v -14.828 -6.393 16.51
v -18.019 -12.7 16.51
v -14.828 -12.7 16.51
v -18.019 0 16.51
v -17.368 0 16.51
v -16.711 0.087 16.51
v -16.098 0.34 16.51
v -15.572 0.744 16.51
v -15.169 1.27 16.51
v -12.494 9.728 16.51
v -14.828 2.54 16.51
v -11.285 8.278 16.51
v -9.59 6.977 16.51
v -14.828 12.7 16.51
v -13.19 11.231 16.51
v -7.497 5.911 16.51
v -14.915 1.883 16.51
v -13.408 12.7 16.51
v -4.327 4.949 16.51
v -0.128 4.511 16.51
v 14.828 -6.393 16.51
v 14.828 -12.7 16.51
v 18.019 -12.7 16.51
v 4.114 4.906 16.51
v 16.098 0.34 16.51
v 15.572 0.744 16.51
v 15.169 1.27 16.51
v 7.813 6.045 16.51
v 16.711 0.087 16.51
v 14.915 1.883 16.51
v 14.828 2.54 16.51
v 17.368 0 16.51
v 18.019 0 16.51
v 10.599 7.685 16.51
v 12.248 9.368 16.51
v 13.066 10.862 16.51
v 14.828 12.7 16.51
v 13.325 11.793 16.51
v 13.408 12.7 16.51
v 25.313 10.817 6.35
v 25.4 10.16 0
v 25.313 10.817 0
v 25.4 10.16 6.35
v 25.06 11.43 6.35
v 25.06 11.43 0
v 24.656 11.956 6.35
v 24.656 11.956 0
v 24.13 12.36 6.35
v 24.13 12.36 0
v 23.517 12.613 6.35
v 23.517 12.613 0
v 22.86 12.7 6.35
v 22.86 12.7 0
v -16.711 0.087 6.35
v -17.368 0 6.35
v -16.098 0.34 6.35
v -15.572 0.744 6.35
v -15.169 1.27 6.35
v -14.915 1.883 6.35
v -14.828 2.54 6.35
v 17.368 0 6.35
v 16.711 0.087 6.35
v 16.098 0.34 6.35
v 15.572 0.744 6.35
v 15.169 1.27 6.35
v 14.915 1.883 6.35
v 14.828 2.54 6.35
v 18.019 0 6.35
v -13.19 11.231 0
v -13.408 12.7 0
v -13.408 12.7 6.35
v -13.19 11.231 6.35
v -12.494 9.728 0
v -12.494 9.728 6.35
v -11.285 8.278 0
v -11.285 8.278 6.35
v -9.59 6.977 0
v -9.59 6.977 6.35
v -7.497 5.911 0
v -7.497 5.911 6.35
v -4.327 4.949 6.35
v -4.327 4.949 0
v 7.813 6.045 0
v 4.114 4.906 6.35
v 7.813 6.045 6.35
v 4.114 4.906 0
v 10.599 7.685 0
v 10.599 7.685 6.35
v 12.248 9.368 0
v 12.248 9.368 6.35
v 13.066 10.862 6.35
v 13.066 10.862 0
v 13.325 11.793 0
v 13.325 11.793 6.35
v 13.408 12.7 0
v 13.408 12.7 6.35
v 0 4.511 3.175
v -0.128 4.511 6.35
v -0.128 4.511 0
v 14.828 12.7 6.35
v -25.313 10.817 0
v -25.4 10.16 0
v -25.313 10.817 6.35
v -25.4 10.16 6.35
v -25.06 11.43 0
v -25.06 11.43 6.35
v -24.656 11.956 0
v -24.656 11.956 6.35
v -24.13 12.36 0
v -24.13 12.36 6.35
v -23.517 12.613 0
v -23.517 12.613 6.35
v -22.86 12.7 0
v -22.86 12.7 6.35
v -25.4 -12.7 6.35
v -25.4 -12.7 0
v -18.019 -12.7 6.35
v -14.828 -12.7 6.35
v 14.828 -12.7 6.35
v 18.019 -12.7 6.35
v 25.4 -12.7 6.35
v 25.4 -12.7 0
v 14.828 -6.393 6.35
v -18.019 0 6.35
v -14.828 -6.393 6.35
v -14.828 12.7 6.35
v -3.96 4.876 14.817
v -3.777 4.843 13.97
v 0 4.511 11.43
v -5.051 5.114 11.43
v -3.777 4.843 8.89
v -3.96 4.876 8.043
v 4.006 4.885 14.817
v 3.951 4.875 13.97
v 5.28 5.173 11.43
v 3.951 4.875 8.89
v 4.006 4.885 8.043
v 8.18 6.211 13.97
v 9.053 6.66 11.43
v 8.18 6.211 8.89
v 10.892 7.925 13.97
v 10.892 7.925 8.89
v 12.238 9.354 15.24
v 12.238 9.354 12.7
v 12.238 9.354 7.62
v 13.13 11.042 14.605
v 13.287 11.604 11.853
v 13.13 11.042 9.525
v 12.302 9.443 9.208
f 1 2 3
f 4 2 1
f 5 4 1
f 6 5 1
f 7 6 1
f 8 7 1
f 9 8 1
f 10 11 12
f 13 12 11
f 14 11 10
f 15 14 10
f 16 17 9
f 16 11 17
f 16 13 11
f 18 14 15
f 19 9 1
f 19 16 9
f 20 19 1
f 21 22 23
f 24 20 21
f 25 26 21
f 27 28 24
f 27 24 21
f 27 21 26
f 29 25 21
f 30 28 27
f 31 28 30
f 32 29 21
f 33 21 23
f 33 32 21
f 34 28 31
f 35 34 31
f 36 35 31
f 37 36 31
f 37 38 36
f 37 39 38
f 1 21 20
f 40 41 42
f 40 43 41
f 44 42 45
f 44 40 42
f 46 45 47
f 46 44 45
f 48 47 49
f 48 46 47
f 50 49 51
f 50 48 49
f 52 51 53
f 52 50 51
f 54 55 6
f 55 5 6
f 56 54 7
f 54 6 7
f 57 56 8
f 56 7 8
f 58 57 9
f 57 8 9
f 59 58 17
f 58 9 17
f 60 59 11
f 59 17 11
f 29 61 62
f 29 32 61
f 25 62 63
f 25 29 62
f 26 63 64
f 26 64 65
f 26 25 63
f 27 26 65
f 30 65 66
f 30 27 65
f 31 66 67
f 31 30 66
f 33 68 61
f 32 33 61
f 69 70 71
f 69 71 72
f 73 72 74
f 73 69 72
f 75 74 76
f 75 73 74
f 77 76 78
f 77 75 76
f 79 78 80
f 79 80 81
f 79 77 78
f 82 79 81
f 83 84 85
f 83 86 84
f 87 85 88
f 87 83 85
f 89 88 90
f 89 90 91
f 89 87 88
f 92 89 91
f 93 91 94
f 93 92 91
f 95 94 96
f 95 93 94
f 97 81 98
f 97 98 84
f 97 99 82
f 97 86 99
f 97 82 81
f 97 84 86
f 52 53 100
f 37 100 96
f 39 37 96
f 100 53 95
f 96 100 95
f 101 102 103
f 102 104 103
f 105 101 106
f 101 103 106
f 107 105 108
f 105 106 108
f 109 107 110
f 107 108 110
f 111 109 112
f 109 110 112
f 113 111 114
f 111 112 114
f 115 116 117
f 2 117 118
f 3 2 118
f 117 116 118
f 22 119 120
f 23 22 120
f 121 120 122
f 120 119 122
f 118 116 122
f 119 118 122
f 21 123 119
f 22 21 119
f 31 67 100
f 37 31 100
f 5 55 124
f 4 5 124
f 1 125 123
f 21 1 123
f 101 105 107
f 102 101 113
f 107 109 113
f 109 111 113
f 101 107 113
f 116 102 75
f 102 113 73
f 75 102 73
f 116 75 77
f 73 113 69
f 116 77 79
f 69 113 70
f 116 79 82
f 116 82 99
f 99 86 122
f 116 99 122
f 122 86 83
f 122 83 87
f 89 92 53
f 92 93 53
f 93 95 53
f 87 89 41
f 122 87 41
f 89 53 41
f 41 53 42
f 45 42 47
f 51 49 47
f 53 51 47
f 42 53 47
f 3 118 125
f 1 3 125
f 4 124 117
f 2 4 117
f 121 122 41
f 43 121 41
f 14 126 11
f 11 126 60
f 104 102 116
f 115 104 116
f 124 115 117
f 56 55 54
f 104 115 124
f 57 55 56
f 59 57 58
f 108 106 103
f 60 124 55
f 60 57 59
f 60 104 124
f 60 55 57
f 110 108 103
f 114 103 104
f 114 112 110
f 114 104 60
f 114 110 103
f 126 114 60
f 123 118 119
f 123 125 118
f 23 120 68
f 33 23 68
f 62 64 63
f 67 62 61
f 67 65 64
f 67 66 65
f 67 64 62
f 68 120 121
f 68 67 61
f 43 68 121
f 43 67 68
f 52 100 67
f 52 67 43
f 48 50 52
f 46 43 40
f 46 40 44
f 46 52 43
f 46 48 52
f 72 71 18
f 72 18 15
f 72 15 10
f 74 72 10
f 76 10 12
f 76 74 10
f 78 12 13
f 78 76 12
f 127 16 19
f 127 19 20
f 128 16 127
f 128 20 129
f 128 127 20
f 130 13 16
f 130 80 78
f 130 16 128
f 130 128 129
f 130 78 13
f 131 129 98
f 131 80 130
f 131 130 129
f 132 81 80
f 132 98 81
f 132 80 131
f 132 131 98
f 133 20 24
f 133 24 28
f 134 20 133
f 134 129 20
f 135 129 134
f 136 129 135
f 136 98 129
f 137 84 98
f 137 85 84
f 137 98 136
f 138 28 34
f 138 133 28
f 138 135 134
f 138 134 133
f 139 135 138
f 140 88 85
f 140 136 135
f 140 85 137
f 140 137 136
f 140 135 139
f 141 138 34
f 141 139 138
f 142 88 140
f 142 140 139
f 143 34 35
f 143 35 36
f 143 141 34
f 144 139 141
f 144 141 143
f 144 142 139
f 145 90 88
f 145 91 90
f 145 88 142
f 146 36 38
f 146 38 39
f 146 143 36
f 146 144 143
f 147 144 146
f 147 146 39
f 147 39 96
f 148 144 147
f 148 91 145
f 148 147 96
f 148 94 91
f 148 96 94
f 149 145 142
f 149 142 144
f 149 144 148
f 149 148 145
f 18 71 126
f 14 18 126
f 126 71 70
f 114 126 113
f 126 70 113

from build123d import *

# Parameters (mm, degrees)
F1_DEPTH = 6.35
F3_DEPTH = 10.16
F4_R     = 2.54


with BuildPart() as f1:
    # F0 (on Top) → F1 (new body)
    with BuildSketch(Plane.XY):
        with BuildLine():
            Line((25.4, -12.7), (25.4, 12.7))
            Line((25.4, 12.7), (13.4078692645, 12.7))
            add(Edge.make_bspline(
                [(-13.4078692645, 12.7), (-13.4078692645, 4.5109884671), (0, 4.5109884671), (13.4078692645, 4.5109884671), (13.4078692645, 12.7)],
                knots=[3.1415926536, 3.1415926536, 3.1415926536, 4.7123889804, 4.7123889804, 6.2831853072, 6.2831853072, 6.2831853072], degree=2, weights=[1, 0.7071067812, 1, 0.7071067812, 1]))
            Line((-13.4078692645, 12.7), (-25.4, 12.7))
            Line((-25.4, 12.7), (-25.4, -12.7))
            Line((-25.4, -12.7), (25.4, -12.7))
        make_face()
    extrude(amount=F1_DEPTH)

    # F2 (on face) → F3 (join)
    with BuildSketch(Plane.XY.offset(6.35)):
        with BuildLine():
            Line((-18.0192738771, -6.3928803429), (-18.0192738771, -12.7))
            Line((-18.0192738771, -12.7), (-14.8282703012, -12.7))
            Line((-14.8282703012, -12.7), (-14.8282703012, -6.3928803429))
            Line((-14.8282703012, -6.3928803429), (0, -6.3928803429))
            Line((0, -6.3928803429), (14.8282703012, -6.3928803429))
            Line((14.8282703012, -6.3928803429), (14.8282703012, -12.7))
            Line((14.8282703012, -12.7), (18.0192738771, -12.7))
            Line((18.0192738771, -12.7), (18.0192738771, -6.3928803429))
            Line((18.0192738771, -6.3928803429), (18.0192738771, 0))
            Line((18.0192738771, 0), (14.8282703012, 0))
            Line((14.8282703012, 0), (14.8282703012, 12.7))
            Line((14.8282703012, 12.7), (13.4078692645, 12.7))
            add(Edge.make_bspline(
                [(-13.4078692645, 12.7), (-13.4078692645, 4.5109884671), (0, 4.5109884671), (13.4078692645, 4.5109884671), (13.4078692645, 12.7)],
                knots=[3.1415926536, 3.1415926536, 3.1415926536, 4.7123889804, 4.7123889804, 6.2831853072, 6.2831853072, 6.2831853072], degree=2, weights=[1, 0.7071067812, 1, 0.7071067812, 1]))
            Line((-13.4078692645, 12.7), (-14.8282703012, 12.7))
            Line((-14.8282703012, 12.7), (-14.8282703012, 0))
            Line((-14.8282703012, 0), (-18.0192738771, 0))
            Line((-18.0192738771, 0), (-18.0192738771, -6.3928803429))
        make_face()
    extrude(amount=F3_DEPTH)

    # F4
    f4_edges = [f1.edges().sort_by_distance(p)[0] for p in [
        (14.82827, 0, 11.43),
        (-14.82827, 0, 11.43),
        (25.4, 12.7, 3.175),
        (-25.4, 12.7, 3.175),
    ]]
    fillet(f4_edges, radius=F4_R)


solid = f1.part
